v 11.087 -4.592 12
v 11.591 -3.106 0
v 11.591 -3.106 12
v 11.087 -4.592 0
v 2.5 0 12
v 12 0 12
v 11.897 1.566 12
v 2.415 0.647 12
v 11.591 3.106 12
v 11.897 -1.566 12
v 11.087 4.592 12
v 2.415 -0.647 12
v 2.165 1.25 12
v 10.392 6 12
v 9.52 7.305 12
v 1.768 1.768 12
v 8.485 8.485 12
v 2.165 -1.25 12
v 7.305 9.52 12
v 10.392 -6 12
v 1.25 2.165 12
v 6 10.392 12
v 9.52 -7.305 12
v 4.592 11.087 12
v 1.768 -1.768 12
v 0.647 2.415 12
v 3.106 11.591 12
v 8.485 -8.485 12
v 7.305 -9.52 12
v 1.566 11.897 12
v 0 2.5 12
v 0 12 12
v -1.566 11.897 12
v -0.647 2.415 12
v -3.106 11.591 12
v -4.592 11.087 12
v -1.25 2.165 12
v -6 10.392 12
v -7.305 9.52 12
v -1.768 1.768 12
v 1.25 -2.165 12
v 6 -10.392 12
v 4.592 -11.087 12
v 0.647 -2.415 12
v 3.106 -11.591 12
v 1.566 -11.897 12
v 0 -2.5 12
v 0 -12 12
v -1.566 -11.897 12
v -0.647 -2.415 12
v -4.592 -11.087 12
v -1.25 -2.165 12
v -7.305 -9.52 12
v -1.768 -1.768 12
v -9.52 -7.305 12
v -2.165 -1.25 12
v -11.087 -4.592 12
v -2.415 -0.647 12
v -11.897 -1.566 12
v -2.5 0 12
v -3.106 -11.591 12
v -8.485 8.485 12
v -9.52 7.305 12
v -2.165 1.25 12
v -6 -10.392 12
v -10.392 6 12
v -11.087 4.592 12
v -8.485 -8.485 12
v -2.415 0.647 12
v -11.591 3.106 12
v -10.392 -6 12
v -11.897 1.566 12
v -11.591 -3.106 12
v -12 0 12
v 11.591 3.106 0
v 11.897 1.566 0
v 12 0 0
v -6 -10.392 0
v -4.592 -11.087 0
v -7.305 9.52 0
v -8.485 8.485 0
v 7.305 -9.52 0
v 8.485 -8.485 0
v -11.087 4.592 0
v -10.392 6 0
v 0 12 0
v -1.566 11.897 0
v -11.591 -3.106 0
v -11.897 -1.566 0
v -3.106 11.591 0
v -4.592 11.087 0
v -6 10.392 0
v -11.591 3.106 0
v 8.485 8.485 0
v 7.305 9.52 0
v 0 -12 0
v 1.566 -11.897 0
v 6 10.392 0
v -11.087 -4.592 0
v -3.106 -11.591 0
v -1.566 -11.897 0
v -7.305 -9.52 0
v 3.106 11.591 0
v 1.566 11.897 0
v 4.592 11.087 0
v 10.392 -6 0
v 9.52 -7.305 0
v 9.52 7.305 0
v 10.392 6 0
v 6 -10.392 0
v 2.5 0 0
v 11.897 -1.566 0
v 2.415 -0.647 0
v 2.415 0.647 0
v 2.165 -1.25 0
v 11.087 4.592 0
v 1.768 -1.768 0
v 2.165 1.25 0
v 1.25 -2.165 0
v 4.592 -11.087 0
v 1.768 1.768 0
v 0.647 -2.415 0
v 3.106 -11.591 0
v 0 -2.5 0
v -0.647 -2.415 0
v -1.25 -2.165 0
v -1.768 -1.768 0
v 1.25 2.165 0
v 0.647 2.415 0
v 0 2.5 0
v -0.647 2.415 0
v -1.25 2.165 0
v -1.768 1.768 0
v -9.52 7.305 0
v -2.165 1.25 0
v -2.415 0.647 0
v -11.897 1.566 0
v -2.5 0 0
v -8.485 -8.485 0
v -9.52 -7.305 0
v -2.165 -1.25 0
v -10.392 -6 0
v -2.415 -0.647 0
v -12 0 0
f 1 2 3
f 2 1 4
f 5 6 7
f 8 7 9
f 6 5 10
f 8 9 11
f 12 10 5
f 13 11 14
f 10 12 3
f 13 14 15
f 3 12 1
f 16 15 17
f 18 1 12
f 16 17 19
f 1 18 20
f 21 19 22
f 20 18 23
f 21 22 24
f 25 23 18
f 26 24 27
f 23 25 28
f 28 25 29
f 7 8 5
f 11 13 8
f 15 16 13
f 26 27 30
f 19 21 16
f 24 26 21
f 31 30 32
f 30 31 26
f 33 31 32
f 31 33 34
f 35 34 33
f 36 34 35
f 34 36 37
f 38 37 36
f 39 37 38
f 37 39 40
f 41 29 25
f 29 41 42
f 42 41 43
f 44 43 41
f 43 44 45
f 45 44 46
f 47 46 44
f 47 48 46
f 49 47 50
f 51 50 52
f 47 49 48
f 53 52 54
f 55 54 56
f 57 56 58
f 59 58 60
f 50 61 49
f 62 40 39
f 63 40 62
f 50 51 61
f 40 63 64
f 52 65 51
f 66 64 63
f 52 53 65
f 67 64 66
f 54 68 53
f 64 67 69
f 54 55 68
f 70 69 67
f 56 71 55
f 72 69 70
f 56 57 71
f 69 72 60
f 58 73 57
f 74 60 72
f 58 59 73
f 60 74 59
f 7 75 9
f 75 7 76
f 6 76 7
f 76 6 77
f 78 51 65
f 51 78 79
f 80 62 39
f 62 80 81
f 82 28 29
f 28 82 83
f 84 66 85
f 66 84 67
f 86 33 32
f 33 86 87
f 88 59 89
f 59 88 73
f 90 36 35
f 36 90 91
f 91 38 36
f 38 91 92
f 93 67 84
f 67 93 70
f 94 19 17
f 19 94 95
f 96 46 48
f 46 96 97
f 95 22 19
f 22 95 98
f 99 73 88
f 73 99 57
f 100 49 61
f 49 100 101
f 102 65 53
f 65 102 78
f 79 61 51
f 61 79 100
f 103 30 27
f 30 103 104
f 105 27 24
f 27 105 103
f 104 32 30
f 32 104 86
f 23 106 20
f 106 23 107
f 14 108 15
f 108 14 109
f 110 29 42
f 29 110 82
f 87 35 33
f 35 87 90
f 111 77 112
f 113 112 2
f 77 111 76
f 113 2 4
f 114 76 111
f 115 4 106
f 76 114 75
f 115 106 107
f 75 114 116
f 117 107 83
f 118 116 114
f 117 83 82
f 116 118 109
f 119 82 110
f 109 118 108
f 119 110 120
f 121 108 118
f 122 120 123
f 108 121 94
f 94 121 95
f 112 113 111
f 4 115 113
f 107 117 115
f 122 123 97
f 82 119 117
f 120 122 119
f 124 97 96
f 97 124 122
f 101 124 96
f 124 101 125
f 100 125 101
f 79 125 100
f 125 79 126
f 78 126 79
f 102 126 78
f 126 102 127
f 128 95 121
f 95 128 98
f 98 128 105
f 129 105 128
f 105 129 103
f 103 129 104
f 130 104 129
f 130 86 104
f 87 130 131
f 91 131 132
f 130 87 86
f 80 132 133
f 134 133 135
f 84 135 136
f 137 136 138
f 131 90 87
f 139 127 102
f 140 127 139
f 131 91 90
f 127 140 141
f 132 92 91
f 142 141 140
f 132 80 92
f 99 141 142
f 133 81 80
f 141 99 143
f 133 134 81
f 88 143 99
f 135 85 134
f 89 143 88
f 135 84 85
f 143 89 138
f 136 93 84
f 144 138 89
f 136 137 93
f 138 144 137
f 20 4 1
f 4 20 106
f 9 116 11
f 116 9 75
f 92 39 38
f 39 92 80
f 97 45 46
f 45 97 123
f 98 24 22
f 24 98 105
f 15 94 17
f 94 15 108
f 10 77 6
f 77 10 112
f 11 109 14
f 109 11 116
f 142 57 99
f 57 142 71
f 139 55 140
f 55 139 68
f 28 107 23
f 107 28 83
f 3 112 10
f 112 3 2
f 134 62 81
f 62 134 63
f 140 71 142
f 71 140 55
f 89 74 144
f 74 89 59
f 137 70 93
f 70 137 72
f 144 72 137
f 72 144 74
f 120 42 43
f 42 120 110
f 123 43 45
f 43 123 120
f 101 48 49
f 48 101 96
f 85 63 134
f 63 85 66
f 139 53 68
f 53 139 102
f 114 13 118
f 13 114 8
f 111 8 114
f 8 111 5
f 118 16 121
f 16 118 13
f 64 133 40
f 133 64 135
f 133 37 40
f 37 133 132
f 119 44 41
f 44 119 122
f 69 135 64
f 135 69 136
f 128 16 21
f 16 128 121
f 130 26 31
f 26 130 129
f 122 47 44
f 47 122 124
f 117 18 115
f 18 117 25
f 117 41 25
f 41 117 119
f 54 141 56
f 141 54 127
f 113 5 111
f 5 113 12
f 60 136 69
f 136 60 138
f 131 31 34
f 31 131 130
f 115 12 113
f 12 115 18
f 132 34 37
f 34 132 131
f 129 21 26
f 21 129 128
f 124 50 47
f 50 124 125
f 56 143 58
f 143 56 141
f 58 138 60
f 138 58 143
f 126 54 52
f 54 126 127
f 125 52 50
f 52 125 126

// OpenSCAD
module hub(){
  difference(){ cylinder(h=12,r=12,$fn=48); translate([0,0,-0.1]) cylinder(h=12.2,r=2.5,$fn=24); }
}
hub();
